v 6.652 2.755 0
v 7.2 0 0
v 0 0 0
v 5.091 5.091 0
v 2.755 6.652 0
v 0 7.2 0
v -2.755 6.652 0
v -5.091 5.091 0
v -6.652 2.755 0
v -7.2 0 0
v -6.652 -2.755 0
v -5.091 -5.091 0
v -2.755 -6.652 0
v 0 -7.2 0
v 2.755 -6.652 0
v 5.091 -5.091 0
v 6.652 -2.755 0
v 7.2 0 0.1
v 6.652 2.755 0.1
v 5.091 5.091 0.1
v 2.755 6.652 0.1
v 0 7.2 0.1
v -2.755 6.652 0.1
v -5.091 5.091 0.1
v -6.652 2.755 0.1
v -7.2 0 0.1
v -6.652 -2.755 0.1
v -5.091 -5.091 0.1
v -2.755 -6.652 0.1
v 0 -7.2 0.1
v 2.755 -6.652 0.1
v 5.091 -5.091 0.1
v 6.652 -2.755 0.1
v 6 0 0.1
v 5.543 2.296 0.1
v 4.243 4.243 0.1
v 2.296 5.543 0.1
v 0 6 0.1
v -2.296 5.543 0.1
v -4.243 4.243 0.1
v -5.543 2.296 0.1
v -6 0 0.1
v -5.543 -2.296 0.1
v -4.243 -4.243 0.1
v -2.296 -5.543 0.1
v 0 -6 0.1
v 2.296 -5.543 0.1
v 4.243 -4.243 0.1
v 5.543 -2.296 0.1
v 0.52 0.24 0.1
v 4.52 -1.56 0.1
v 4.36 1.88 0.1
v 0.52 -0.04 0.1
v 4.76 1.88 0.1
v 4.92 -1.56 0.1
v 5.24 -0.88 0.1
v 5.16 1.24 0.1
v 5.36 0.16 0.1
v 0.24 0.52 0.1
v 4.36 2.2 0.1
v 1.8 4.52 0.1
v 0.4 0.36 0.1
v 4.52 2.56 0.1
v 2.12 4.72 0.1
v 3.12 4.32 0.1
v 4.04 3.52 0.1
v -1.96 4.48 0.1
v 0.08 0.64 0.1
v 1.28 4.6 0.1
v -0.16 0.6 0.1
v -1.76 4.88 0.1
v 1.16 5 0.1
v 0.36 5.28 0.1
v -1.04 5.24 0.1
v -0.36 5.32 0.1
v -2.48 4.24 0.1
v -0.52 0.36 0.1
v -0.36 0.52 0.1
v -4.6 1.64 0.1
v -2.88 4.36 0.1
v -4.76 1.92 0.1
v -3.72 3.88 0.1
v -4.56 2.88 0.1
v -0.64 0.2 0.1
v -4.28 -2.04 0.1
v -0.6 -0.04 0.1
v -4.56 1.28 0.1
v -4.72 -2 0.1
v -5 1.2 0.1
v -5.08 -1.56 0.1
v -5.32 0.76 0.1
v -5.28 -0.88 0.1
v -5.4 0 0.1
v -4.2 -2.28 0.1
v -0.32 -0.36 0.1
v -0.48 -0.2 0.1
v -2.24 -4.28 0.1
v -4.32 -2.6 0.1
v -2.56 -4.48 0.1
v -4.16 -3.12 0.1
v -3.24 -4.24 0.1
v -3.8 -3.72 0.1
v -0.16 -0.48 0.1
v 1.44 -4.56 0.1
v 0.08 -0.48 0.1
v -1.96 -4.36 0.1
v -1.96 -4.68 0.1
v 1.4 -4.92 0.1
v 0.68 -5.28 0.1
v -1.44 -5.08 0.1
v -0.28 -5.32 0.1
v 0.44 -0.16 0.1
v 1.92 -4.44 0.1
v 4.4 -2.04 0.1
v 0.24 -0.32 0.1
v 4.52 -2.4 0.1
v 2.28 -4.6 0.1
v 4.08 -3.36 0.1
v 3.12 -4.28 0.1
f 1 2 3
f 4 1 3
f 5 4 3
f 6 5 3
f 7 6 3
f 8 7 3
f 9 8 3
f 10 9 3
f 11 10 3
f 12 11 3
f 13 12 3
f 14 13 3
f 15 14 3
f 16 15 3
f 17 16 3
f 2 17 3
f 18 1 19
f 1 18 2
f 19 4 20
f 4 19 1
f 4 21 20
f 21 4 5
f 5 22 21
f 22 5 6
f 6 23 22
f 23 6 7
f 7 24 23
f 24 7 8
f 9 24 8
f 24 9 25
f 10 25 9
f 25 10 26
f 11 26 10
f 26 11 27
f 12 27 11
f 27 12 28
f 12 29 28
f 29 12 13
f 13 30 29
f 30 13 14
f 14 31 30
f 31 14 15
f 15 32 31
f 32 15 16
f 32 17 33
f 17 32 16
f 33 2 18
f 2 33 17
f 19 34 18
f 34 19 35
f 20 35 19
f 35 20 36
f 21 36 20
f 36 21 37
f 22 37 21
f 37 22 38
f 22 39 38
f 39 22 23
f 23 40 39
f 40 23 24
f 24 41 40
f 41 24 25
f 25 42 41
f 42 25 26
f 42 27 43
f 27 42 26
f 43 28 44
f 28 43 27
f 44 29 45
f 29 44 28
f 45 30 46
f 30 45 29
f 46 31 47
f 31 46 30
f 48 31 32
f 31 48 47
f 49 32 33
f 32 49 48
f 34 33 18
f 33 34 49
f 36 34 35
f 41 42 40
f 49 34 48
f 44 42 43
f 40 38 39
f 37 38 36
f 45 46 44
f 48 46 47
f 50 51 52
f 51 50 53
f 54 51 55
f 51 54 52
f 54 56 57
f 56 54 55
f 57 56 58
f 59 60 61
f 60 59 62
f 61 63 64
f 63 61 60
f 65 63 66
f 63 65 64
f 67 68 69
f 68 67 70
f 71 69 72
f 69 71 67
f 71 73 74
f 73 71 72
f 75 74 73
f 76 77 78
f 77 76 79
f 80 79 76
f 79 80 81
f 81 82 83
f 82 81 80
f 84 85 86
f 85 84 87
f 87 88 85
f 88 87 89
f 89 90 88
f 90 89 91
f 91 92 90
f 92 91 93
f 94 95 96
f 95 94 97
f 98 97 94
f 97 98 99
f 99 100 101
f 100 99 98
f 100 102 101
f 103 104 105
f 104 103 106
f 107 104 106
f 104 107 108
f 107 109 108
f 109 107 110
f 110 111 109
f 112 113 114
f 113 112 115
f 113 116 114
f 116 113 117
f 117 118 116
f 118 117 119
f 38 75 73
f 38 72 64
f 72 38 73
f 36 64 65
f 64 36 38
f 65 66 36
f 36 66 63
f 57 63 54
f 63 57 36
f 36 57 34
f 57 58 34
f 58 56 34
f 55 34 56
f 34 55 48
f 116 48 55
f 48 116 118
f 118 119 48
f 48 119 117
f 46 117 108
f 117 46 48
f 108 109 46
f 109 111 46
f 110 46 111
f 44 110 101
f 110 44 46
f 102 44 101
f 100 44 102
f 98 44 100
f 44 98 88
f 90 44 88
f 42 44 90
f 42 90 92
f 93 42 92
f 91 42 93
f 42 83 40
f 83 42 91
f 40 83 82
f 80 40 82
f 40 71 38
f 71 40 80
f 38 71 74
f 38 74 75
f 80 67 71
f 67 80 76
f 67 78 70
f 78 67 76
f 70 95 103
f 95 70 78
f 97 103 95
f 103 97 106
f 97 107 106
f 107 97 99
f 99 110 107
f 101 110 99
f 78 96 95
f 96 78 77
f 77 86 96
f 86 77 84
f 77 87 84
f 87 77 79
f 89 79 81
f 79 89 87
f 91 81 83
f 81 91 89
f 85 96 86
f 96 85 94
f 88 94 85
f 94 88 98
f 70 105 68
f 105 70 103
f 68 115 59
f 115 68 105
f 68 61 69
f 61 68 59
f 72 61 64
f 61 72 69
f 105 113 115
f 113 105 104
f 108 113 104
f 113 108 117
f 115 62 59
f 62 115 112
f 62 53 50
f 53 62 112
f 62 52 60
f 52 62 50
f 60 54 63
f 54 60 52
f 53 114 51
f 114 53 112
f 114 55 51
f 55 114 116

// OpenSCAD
// file: ../p/4-4ring5.scad
use <../lib.scad>
function ldraw_lib__4_4ring5() = [
// 0 Ring  5 x 1.0
// 0 Name: 4-4ring5.dat
// 0 Author: Mark Kennedy [mkennedy]
// 0 !LDRAW_ORG Primitive UPDATE 2025-01
// 0 !LICENSE Licensed under CC BY 4.0 : see CAreadme.txt
// 
// 0 BFC CERTIFY CCW
  [0,"BFC","CERTIFY"],
  [0,"BFC","CCW"],
// 
// 0 !HISTORY 2001-10-23 [pneaster] resequenced quads, corrected winding.
// 0 !HISTORY 2001-12-29 [pneaster] Added BFC.
// 0 !HISTORY 2002-04-25 [PTadmin] Official Update 2002-02
// 0 !HISTORY 2007-06-24 [PTadmin] Header formatted for Contributor Agreement
// 0 !HISTORY 2008-07-01 [PTadmin] Official Update 2008-01
// 0 !HISTORY 2012-02-16 [Philo] Changed to CCW
// 0 !HISTORY 2012-03-30 [PTadmin] Official Update 2012-01
// 0 !HISTORY 2024-12-30 [MagFors] Recreated using PrimGen
// 0 !HISTORY 2025-01-20 [OrionP] Official Update 2025-01
// 
// 4 16 6 0 0 5.5434 0 2.2962 4.6195 0 1.9135 5 0 0
  [4,16,6,0,0,5.5434,0,2.2962,4.6195,0,1.9135,5,0,0],
// 4 16 5.5434 0 2.2962 4.2426 0 4.2426 3.5355 0 3.5355 4.6195 0 1.9135
  [4,16,5.5434,0,2.2962,4.2426,0,4.2426,3.5355,0,3.5355,4.6195,0,1.9135],
// 4 16 4.2426 0 4.2426 2.2962 0 5.5434 1.9135 0 4.6195 3.5355 0 3.5355
  [4,16,4.2426,0,4.2426,2.2962,0,5.5434,1.9135,0,4.6195,3.5355,0,3.5355],
// 4 16 2.2962 0 5.5434 0 0 6 0 0 5 1.9135 0 4.6195
  [4,16,2.2962,0,5.5434,0,0,6,0,0,5,1.9135,0,4.6195],
// 4 16 0 0 6 -2.2962 0 5.5434 -1.9135 0 4.6195 0 0 5
  [4,16,0,0,6,-2.2962,0,5.5434,-1.9135,0,4.6195,0,0,5],
// 4 16 -2.2962 0 5.5434 -4.2426 0 4.2426 -3.5355 0 3.5355 -1.9135 0 4.6195
  [4,16,-2.2962,0,5.5434,-4.2426,0,4.2426,-3.5355,0,3.5355,-1.9135,0,4.6195],
// 4 16 -4.2426 0 4.2426 -5.5434 0 2.2962 -4.6195 0 1.9135 -3.5355 0 3.5355
  [4,16,-4.2426,0,4.2426,-5.5434,0,2.2962,-4.6195,0,1.9135,-3.5355,0,3.5355],
// 4 16 -5.5434 0 2.2962 -6 0 0 -5 0 0 -4.6195 0 1.9135
  [4,16,-5.5434,0,2.2962,-6,0,0,-5,0,0,-4.6195,0,1.9135],
// 4 16 -6 0 0 -5.5434 0 -2.2962 -4.6195 0 -1.9135 -5 0 0
  [4,16,-6,0,0,-5.5434,0,-2.2962,-4.6195,0,-1.9135,-5,0,0],
// 4 16 -5.5434 0 -2.2962 -4.2426 0 -4.2426 -3.5355 0 -3.5355 -4.6195 0 -1.9135
  [4,16,-5.5434,0,-2.2962,-4.2426,0,-4.2426,-3.5355,0,-3.5355,-4.6195,0,-1.9135],
// 4 16 -4.2426 0 -4.2426 -2.2962 0 -5.5434 -1.9135 0 -4.6195 -3.5355 0 -3.5355
  [4,16,-4.2426,0,-4.2426,-2.2962,0,-5.5434,-1.9135,0,-4.6195,-3.5355,0,-3.5355],
// 4 16 -2.2962 0 -5.5434 0 0 -6 0 0 -5 -1.9135 0 -4.6195
  [4,16,-2.2962,0,-5.5434,0,0,-6,0,0,-5,-1.9135,0,-4.6195],
// 4 16 0 0 -6 2.2962 0 -5.5434 1.9135 0 -4.6195 0 0 -5
  [4,16,0,0,-6,2.2962,0,-5.5434,1.9135,0,-4.6195,0,0,-5],
// 4 16 2.2962 0 -5.5434 4.2426 0 -4.2426 3.5355 0 -3.5355 1.9135 0 -4.6195
  [4,16,2.2962,0,-5.5434,4.2426,0,-4.2426,3.5355,0,-3.5355,1.9135,0,-4.6195],
// 4 16 4.2426 0 -4.2426 5.5434 0 -2.2962 4.6195 0 -1.9135 3.5355 0 -3.5355
  [4,16,4.2426,0,-4.2426,5.5434,0,-2.2962,4.6195,0,-1.9135,3.5355,0,-3.5355],
// 4 16 5.5434 0 -2.2962 6 0 0 5 0 0 4.6195 0 -1.9135
  [4,16,5.5434,0,-2.2962,6,0,0,5,0,0,4.6195,0,-1.9135],
// 0 // Build by LDPartEditor (PrimGen 2.X)
];
module ldraw_lib__4_4ring5(step=0, col=false, unit=2/5, alt=false, line=0.2, solid=!$preview)
    makepoly(ldraw_lib__4_4ring5(), step=step, col=col, unit=unit, alt=alt, line=line, solid=solid);
ldraw_lib__4_4ring5(line=0.2);
// file: ../p/1-8chrd.scad
use <../lib.scad>
function ldraw_lib__1_8chrd() = [
// 0 Chord 0.125
// 0 Name: 1-8chrd.dat
// 0 Author: Orion Pobursky [OrionP]
// 0 !LDRAW_ORG Primitive UPDATE 2023-05
// 0 !LICENSE Licensed under CC BY 4.0 : see CAreadme.txt
// 
// 0 BFC CERTIFY CCW
  [0,"BFC","CERTIFY"],
  [0,"BFC","CCW"],
// 
// 0 !HISTORY 2004-04-22 [PTadmin] Official Update 2004-02
// 0 !HISTORY 2007-06-22 [PTadmin] Header formatted for Contributor Agreement
// 0 !HISTORY 2008-07-01 [PTadmin] Official Update 2008-01
// 0 !HISTORY 2023-10-27 [OrionP] Rebuilt with PrimGen2, original author westrate
// 0 !HISTORY 2023-10-31 [OrionP] Official Update 2023-05
// 
// 3 16 1 0 0 0.9239 0 0.3827 0.7071 0 0.7071
  [3,16,1,0,0,0.9239,0,0.3827,0.7071,0,0.7071],
];
module ldraw_lib__1_8chrd(step=0, col=false, unit=2/5, alt=false, line=0.2, solid=!$preview)
    makepoly(ldraw_lib__1_8chrd(), step=step, col=col, unit=unit, alt=alt, line=line, solid=solid);
ldraw_lib__1_8chrd(line=0.2);
// file: ../p/4-4disc.scad
use <../lib.scad>
function ldraw_lib__4_4disc() = [
// 0 Disc 1.0
// 0 Name: 4-4disc.dat
// 0 Author: James Jessiman
// 0 !LDRAW_ORG Primitive UPDATE 2002-02
// 0 !LICENSE Licensed under CC BY 4.0 : see CAreadme.txt
// 
// 0 BFC CERTIFY CCW
  [0,"BFC","CERTIFY"],
  [0,"BFC","CCW"],
// 
// 0 !HISTORY 1998-12-15 [PTadmin] Official Update 1998-10
// 0 !HISTORY 2002-03-23 [sbliss] Added BFC statement
// 0 !HISTORY 2002-04-25 [PTadmin] Official Update 2002-02
// 0 !HISTORY 2007-06-24 [PTadmin] Header formatted for Contributor Agreement
// 0 !HISTORY 2008-07-01 [PTadmin] Official Update 2008-01
// 
// 
// 3 16 0 0 0 1 0 0 0.9239 0 0.3827
  [3,16,0,0,0,1,0,0,0.9239,0,0.3827],
// 3 16 0 0 0 0.9239 0 0.3827 0.7071 0 0.7071
  [3,16,0,0,0,0.9239,0,0.3827,0.7071,0,0.7071],
// 3 16 0 0 0 0.7071 0 0.7071 0.3827 0 0.9239
  [3,16,0,0,0,0.7071,0,0.7071,0.3827,0,0.9239],
// 3 16 0 0 0 0.3827 0 0.9239 0 0 1
  [3,16,0,0,0,0.3827,0,0.9239,0,0,1],
// 3 16 0 0 0 0 0 1 -0.3827 0 0.9239
  [3,16,0,0,0,0,0,1,-0.3827,0,0.9239],
// 3 16 0 0 0 -0.3827 0 0.9239 -0.7071 0 0.7071
  [3,16,0,0,0,-0.3827,0,0.9239,-0.7071,0,0.7071],
// 3 16 0 0 0 -0.7071 0 0.7071 -0.9239 0 0.3827
  [3,16,0,0,0,-0.7071,0,0.7071,-0.9239,0,0.3827],
// 3 16 0 0 0 -0.9239 0 0.3827 -1 0 -0
  [3,16,0,0,0,-0.9239,0,0.3827,-1,0,-0],
// 3 16 0 0 0 -1 0 -0 -0.9239 0 -0.3827
  [3,16,0,0,0,-1,0,-0,-0.9239,0,-0.3827],
// 3 16 0 0 0 -0.9239 0 -0.3827 -0.7071 0 -0.7071
  [3,16,0,0,0,-0.9239,0,-0.3827,-0.7071,0,-0.7071],
// 3 16 0 0 0 -0.7071 0 -0.7071 -0.3827 0 -0.9239
  [3,16,0,0,0,-0.7071,0,-0.7071,-0.3827,0,-0.9239],
// 3 16 0 0 0 -0.3827 0 -0.9239 0 0 -1
  [3,16,0,0,0,-0.3827,0,-0.9239,0,0,-1],
// 3 16 0 0 0 0 0 -1 0.3827 0 -0.9239
  [3,16,0,0,0,0,0,-1,0.3827,0,-0.9239],
// 3 16 0 0 0 0.3827 0 -0.9239 0.7071 0 -0.7071
  [3,16,0,0,0,0.3827,0,-0.9239,0.7071,0,-0.7071],
// 3 16 0 0 0 0.7071 0 -0.7071 0.9239 0 -0.3827
  [3,16,0,0,0,0.7071,0,-0.7071,0.9239,0,-0.3827],
// 3 16 0 0 0 0.9239 0 -0.3827 1 0 0
  [3,16,0,0,0,0.9239,0,-0.3827,1,0,0],
// 0
];
module ldraw_lib__4_4disc(step=0, col=false, unit=2/5, alt=false, line=0.2, solid=!$preview)
    makepoly(ldraw_lib__4_4disc(), step=step, col=col, unit=unit, alt=alt, line=line, solid=solid);
ldraw_lib__4_4disc(line=0.2);
// file: ../p/4-4cyli.scad
use <../lib.scad>
function ldraw_lib__4_4cyli() = [
// 0 Cylinder 1.0
// 0 Name: 4-4cyli.dat
// 0 Author: James Jessiman
// 0 !LDRAW_ORG Primitive UPDATE 2005-01
// 0 !LICENSE Licensed under CC BY 4.0 : see CAreadme.txt
// 
// 0 BFC CERTIFY CCW
  [0,"BFC","CERTIFY"],
  [0,"BFC","CCW"],
// 
// 0 !HISTORY 1998-12-15 [PTadmin] Official Update 1998-10
// 0 !HISTORY 2002-03-23 [sbliss] Added BFC statement; merged headers from files in distributions LDraw 0.27 and Complete.
// 0 !HISTORY 2002-04-25 [PTadmin] Official Update 2002-02
// 0 !HISTORY 2004-12-14 [guyvivan] BFC CCW
// 0 !HISTORY 2005-12-28 [PTadmin] Official Update 2005-01
// 0 !HISTORY 2007-06-24 [PTadmin] Header formatted for Contributor Agreement
// 0 !HISTORY 2008-07-01 [PTadmin] Official Update 2008-01
// 
// 
// 4 16 1 1 0 0.9239 1 0.3827 0.9239 0 0.3827 1 0 0
  [4,16,1,1,0,0.9239,1,0.3827,0.9239,0,0.3827,1,0,0],
// 5 24 1 0 0 1 1 0 0.9239 0 0.3827 0.9239 0 -0.3827
  [5,24,1,0,0,1,1,0,0.9239,0,0.3827,0.9239,0,-0.3827],
// 4 16 0.9239 1 0.3827 0.7071 1 0.7071 0.7071 0 0.7071 0.9239 0 0.3827
  [4,16,0.9239,1,0.3827,0.7071,1,0.7071,0.7071,0,0.7071,0.9239,0,0.3827],
// 5 24 0.9239 0 0.3827 0.9239 1 0.3827 0.7071 0 0.7071 1 0 0
  [5,24,0.9239,0,0.3827,0.9239,1,0.3827,0.7071,0,0.7071,1,0,0],
// 4 16 0.7071 1 0.7071 0.3827 1 0.9239 0.3827 0 0.9239 0.7071 0 0.7071
  [4,16,0.7071,1,0.7071,0.3827,1,0.9239,0.3827,0,0.9239,0.7071,0,0.7071],
// 5 24 0.7071 0 0.7071 0.7071 1 0.7071 0.3827 0 0.9239 0.9239 0 0.3827
  [5,24,0.7071,0,0.7071,0.7071,1,0.7071,0.3827,0,0.9239,0.9239,0,0.3827],
// 4 16 0.3827 1 0.9239 0 1 1 0 0 1 0.3827 0 0.9239
  [4,16,0.3827,1,0.9239,0,1,1,0,0,1,0.3827,0,0.9239],
// 5 24 0.3827 0 0.9239 0.3827 1 0.9239 0 0 1 0.7071 0 0.7071
  [5,24,0.3827,0,0.9239,0.3827,1,0.9239,0,0,1,0.7071,0,0.7071],
// 4 16 0 1 1 -0.3827 1 0.9239 -0.3827 0 0.9239 0 0 1
  [4,16,0,1,1,-0.3827,1,0.9239,-0.3827,0,0.9239,0,0,1],
// 5 24 0 0 1 0 1 1 -0.3827 0 0.9239 0.3827 0 0.9239
  [5,24,0,0,1,0,1,1,-0.3827,0,0.9239,0.3827,0,0.9239],
// 4 16 -0.3827 1 0.9239 -0.7071 1 0.7071 -0.7071 0 0.7071 -0.3827 0 0.9239
  [4,16,-0.3827,1,0.9239,-0.7071,1,0.7071,-0.7071,0,0.7071,-0.3827,0,0.9239],
// 5 24 -0.3827 0 0.9239 -0.3827 1 0.9239 -0.7071 0 0.7071 0 0 1
  [5,24,-0.3827,0,0.9239,-0.3827,1,0.9239,-0.7071,0,0.7071,0,0,1],
// 4 16 -0.7071 1 0.7071 -0.9239 1 0.3827 -0.9239 0 0.3827 -0.7071 0 0.7071
  [4,16,-0.7071,1,0.7071,-0.9239,1,0.3827,-0.9239,0,0.3827,-0.7071,0,0.7071],
// 5 24 -0.7071 0 0.7071 -0.7071 1 0.7071 -0.9239 0 0.3827 -0.3827 0 0.9239
  [5,24,-0.7071,0,0.7071,-0.7071,1,0.7071,-0.9239,0,0.3827,-0.3827,0,0.9239],
// 4 16 -0.9239 1 0.3827 -1 1 0 -1 0 0 -0.9239 0 0.3827
  [4,16,-0.9239,1,0.3827,-1,1,0,-1,0,0,-0.9239,0,0.3827],
// 5 24 -0.9239 0 0.3827 -0.9239 1 0.3827 -1 0 0 -0.7071 0 0.7071
  [5,24,-0.9239,0,0.3827,-0.9239,1,0.3827,-1,0,0,-0.7071,0,0.7071],
// 4 16 -1 1 0 -0.9239 1 -0.3827 -0.9239 0 -0.3827 -1 0 0
  [4,16,-1,1,0,-0.9239,1,-0.3827,-0.9239,0,-0.3827,-1,0,0],
// 5 24 -1 0 0 -1 1 0 -0.9239 0 -0.3827 -0.9239 0 0.3827
  [5,24,-1,0,0,-1,1,0,-0.9239,0,-0.3827,-0.9239,0,0.3827],
// 4 16 -0.9239 1 -0.3827 -0.7071 1 -0.7071 -0.7071 0 -0.7071 -0.9239 0 -0.3827
  [4,16,-0.9239,1,-0.3827,-0.7071,1,-0.7071,-0.7071,0,-0.7071,-0.9239,0,-0.3827],
// 5 24 -0.9239 0 -0.3827 -0.9239 1 -0.3827 -0.7071 0 -0.7071 -1 0 0
  [5,24,-0.9239,0,-0.3827,-0.9239,1,-0.3827,-0.7071,0,-0.7071,-1,0,0],
// 4 16 -0.7071 1 -0.7071 -0.3827 1 -0.9239 -0.3827 0 -0.9239 -0.7071 0 -0.7071
  [4,16,-0.7071,1,-0.7071,-0.3827,1,-0.9239,-0.3827,0,-0.9239,-0.7071,0,-0.7071],
// 5 24 -0.7071 0 -0.7071 -0.7071 1 -0.7071 -0.3827 0 -0.9239 -0.9239 0 -0.3827
  [5,24,-0.7071,0,-0.7071,-0.7071,1,-0.7071,-0.3827,0,-0.9239,-0.9239,0,-0.3827],
// 4 16 -0.3827 1 -0.9239 0 1 -1 0 0 -1 -0.3827 0 -0.9239
  [4,16,-0.3827,1,-0.9239,0,1,-1,0,0,-1,-0.3827,0,-0.9239],
// 5 24 -0.3827 0 -0.9239 -0.3827 1 -0.9239 0 0 -1 -0.7071 0 -0.7071
  [5,24,-0.3827,0,-0.9239,-0.3827,1,-0.9239,0,0,-1,-0.7071,0,-0.7071],
// 4 16 0 1 -1 0.3827 1 -0.9239 0.3827 0 -0.9239 0 0 -1
  [4,16,0,1,-1,0.3827,1,-0.9239,0.3827,0,-0.9239,0,0,-1],
// 5 24 0 0 -1 0 1 -1 0.3827 0 -0.9239 -0.3827 0 -0.9239
  [5,24,0,0,-1,0,1,-1,0.3827,0,-0.9239,-0.3827,0,-0.9239],
// 4 16 0.3827 1 -0.9239 0.7071 1 -0.7071 0.7071 0 -0.7071 0.3827 0 -0.9239
  [4,16,0.3827,1,-0.9239,0.7071,1,-0.7071,0.7071,0,-0.7071,0.3827,0,-0.9239],
// 5 24 0.3827 0 -0.9239 0.3827 1 -0.9239 0.7071 0 -0.7071 0 0 -1
  [5,24,0.3827,0,-0.9239,0.3827,1,-0.9239,0.7071,0,-0.7071,0,0,-1],
// 4 16 0.7071 1 -0.7071 0.9239 1 -0.3827 0.9239 0 -0.3827 0.7071 0 -0.7071
  [4,16,0.7071,1,-0.7071,0.9239,1,-0.3827,0.9239,0,-0.3827,0.7071,0,-0.7071],
// 5 24 0.7071 0 -0.7071 0.7071 1 -0.7071 0.9239 0 -0.3827 0.3827 0 -0.9239
  [5,24,0.7071,0,-0.7071,0.7071,1,-0.7071,0.9239,0,-0.3827,0.3827,0,-0.9239],
// 4 16 0.9239 1 -0.3827 1 1 0 1 0 0 0.9239 0 -0.3827
  [4,16,0.9239,1,-0.3827,1,1,0,1,0,0,0.9239,0,-0.3827],
// 5 24 0.9239 0 -0.3827 0.9239 1 -0.3827 1 0 0 0.7071 0 -0.7071
  [5,24,0.9239,0,-0.3827,0.9239,1,-0.3827,1,0,0,0.7071,0,-0.7071],
// 0
];
module ldraw_lib__4_4cyli(step=0, col=false, unit=2/5, alt=false, line=0.2, solid=!$preview)
    makepoly(ldraw_lib__4_4cyli(), step=step, col=col, unit=unit, alt=alt, line=line, solid=solid);
ldraw_lib__4_4cyli(line=0.2);
// file: ../p/4-4cylc3.scad
use <../lib.scad>
use <4-4cyli.scad>
use <4-4disc.scad>
function ldraw_lib__4_4cylc3() = [
// 0 Cylinder Closed 1.0 without Top or Bottom Edge Lines
// 0 Name: 4-4cylc3.dat
// 0 Author: Chris Dee [cwdee]
// 0 !LDRAW_ORG Primitive UPDATE 2017-01
// 0 !LICENSE Licensed under CC BY 4.0 : see CAreadme.txt
// 
// 0 BFC CERTIFY CCW
  [0,"BFC","CERTIFY"],
  [0,"BFC","CCW"],
// 
// 0 !HISTORY 2017-12-30 [PTadmin] Official Update 2017-01
// 
// 
// 1 16 0 0 0 1 0 0 0 1 0 0 0 1 4-4disc.dat
  [1,16,0,0,0,1,0,0,0,1,0,0,0,1, ldraw_lib__4_4disc()],
// 1 16 0 0 0 1 0 0 0 1 0 0 0 1 4-4cyli.dat
  [1,16,0,0,0,1,0,0,0,1,0,0,0,1, ldraw_lib__4_4cyli()],
// 0
];
module ldraw_lib__4_4cylc3(step=0, col=false, unit=2/5, alt=false, line=0.2, solid=!$preview)
    makepoly(ldraw_lib__4_4cylc3(), step=step, col=col, unit=unit, alt=alt, line=line, solid=solid);
ldraw_lib__4_4cylc3(line=0.2);
// main file
use <../lib.scad>
use <../p/4-4cylc3.scad>
use <s/6057849bs01.scad>
function ldraw_lib__6057849g() = [
// 0 Sticker  1.8 x  1.8 with Lime Fruit Slice
// 0 Name: 6057849g.dat
// 0 Author: Takeshi Takahashi [RainbowDolphin]
// 0 !LDRAW_ORG Part UPDATE 2025-11
// 0 !LICENSE Licensed under CC BY 4.0 : see CAreadme.txt
// 
// 0 BFC CERTIFY CCW
  [0,"BFC","CERTIFY"],
  [0,"BFC","CCW"],
// 
// 0 !KEYWORDS BrickLink 41035stk01a, Brickowl 599615, Cafe, Friends, Fruit
// 0 !KEYWORDS Heartlake juice bar, Rebrickable 16264, Set 41035, Signboard
// 
// 0 !HISTORY 2025-11-30 [OrionP] Official Update 2025-11
// 
// 1 16 0 0 0 18 0 0 0 -0.25 0 0 0 18 4-4cylc3.dat
  [1,16,0,0,0,18,0,0,0,-0.25,0,0,0,18, ldraw_lib__4_4cylc3()],
// 1 27 0 0 0 1 0 0 0 1 0 0 0 1 s\6057849bs01.dat
  [1,27,0,0,0,1,0,0,0,1,0,0,0,1, ldraw_lib__s__6057849bs01()],
];
module ldraw_lib__6057849g(step=0, col=false, unit=2/5, alt=false, line=0.2, solid=!$preview)
    makepoly(ldraw_lib__6057849g(), step=step, col=col, unit=unit, alt=alt, line=line, solid=solid);
ldraw_lib__6057849g(line=0.2);
